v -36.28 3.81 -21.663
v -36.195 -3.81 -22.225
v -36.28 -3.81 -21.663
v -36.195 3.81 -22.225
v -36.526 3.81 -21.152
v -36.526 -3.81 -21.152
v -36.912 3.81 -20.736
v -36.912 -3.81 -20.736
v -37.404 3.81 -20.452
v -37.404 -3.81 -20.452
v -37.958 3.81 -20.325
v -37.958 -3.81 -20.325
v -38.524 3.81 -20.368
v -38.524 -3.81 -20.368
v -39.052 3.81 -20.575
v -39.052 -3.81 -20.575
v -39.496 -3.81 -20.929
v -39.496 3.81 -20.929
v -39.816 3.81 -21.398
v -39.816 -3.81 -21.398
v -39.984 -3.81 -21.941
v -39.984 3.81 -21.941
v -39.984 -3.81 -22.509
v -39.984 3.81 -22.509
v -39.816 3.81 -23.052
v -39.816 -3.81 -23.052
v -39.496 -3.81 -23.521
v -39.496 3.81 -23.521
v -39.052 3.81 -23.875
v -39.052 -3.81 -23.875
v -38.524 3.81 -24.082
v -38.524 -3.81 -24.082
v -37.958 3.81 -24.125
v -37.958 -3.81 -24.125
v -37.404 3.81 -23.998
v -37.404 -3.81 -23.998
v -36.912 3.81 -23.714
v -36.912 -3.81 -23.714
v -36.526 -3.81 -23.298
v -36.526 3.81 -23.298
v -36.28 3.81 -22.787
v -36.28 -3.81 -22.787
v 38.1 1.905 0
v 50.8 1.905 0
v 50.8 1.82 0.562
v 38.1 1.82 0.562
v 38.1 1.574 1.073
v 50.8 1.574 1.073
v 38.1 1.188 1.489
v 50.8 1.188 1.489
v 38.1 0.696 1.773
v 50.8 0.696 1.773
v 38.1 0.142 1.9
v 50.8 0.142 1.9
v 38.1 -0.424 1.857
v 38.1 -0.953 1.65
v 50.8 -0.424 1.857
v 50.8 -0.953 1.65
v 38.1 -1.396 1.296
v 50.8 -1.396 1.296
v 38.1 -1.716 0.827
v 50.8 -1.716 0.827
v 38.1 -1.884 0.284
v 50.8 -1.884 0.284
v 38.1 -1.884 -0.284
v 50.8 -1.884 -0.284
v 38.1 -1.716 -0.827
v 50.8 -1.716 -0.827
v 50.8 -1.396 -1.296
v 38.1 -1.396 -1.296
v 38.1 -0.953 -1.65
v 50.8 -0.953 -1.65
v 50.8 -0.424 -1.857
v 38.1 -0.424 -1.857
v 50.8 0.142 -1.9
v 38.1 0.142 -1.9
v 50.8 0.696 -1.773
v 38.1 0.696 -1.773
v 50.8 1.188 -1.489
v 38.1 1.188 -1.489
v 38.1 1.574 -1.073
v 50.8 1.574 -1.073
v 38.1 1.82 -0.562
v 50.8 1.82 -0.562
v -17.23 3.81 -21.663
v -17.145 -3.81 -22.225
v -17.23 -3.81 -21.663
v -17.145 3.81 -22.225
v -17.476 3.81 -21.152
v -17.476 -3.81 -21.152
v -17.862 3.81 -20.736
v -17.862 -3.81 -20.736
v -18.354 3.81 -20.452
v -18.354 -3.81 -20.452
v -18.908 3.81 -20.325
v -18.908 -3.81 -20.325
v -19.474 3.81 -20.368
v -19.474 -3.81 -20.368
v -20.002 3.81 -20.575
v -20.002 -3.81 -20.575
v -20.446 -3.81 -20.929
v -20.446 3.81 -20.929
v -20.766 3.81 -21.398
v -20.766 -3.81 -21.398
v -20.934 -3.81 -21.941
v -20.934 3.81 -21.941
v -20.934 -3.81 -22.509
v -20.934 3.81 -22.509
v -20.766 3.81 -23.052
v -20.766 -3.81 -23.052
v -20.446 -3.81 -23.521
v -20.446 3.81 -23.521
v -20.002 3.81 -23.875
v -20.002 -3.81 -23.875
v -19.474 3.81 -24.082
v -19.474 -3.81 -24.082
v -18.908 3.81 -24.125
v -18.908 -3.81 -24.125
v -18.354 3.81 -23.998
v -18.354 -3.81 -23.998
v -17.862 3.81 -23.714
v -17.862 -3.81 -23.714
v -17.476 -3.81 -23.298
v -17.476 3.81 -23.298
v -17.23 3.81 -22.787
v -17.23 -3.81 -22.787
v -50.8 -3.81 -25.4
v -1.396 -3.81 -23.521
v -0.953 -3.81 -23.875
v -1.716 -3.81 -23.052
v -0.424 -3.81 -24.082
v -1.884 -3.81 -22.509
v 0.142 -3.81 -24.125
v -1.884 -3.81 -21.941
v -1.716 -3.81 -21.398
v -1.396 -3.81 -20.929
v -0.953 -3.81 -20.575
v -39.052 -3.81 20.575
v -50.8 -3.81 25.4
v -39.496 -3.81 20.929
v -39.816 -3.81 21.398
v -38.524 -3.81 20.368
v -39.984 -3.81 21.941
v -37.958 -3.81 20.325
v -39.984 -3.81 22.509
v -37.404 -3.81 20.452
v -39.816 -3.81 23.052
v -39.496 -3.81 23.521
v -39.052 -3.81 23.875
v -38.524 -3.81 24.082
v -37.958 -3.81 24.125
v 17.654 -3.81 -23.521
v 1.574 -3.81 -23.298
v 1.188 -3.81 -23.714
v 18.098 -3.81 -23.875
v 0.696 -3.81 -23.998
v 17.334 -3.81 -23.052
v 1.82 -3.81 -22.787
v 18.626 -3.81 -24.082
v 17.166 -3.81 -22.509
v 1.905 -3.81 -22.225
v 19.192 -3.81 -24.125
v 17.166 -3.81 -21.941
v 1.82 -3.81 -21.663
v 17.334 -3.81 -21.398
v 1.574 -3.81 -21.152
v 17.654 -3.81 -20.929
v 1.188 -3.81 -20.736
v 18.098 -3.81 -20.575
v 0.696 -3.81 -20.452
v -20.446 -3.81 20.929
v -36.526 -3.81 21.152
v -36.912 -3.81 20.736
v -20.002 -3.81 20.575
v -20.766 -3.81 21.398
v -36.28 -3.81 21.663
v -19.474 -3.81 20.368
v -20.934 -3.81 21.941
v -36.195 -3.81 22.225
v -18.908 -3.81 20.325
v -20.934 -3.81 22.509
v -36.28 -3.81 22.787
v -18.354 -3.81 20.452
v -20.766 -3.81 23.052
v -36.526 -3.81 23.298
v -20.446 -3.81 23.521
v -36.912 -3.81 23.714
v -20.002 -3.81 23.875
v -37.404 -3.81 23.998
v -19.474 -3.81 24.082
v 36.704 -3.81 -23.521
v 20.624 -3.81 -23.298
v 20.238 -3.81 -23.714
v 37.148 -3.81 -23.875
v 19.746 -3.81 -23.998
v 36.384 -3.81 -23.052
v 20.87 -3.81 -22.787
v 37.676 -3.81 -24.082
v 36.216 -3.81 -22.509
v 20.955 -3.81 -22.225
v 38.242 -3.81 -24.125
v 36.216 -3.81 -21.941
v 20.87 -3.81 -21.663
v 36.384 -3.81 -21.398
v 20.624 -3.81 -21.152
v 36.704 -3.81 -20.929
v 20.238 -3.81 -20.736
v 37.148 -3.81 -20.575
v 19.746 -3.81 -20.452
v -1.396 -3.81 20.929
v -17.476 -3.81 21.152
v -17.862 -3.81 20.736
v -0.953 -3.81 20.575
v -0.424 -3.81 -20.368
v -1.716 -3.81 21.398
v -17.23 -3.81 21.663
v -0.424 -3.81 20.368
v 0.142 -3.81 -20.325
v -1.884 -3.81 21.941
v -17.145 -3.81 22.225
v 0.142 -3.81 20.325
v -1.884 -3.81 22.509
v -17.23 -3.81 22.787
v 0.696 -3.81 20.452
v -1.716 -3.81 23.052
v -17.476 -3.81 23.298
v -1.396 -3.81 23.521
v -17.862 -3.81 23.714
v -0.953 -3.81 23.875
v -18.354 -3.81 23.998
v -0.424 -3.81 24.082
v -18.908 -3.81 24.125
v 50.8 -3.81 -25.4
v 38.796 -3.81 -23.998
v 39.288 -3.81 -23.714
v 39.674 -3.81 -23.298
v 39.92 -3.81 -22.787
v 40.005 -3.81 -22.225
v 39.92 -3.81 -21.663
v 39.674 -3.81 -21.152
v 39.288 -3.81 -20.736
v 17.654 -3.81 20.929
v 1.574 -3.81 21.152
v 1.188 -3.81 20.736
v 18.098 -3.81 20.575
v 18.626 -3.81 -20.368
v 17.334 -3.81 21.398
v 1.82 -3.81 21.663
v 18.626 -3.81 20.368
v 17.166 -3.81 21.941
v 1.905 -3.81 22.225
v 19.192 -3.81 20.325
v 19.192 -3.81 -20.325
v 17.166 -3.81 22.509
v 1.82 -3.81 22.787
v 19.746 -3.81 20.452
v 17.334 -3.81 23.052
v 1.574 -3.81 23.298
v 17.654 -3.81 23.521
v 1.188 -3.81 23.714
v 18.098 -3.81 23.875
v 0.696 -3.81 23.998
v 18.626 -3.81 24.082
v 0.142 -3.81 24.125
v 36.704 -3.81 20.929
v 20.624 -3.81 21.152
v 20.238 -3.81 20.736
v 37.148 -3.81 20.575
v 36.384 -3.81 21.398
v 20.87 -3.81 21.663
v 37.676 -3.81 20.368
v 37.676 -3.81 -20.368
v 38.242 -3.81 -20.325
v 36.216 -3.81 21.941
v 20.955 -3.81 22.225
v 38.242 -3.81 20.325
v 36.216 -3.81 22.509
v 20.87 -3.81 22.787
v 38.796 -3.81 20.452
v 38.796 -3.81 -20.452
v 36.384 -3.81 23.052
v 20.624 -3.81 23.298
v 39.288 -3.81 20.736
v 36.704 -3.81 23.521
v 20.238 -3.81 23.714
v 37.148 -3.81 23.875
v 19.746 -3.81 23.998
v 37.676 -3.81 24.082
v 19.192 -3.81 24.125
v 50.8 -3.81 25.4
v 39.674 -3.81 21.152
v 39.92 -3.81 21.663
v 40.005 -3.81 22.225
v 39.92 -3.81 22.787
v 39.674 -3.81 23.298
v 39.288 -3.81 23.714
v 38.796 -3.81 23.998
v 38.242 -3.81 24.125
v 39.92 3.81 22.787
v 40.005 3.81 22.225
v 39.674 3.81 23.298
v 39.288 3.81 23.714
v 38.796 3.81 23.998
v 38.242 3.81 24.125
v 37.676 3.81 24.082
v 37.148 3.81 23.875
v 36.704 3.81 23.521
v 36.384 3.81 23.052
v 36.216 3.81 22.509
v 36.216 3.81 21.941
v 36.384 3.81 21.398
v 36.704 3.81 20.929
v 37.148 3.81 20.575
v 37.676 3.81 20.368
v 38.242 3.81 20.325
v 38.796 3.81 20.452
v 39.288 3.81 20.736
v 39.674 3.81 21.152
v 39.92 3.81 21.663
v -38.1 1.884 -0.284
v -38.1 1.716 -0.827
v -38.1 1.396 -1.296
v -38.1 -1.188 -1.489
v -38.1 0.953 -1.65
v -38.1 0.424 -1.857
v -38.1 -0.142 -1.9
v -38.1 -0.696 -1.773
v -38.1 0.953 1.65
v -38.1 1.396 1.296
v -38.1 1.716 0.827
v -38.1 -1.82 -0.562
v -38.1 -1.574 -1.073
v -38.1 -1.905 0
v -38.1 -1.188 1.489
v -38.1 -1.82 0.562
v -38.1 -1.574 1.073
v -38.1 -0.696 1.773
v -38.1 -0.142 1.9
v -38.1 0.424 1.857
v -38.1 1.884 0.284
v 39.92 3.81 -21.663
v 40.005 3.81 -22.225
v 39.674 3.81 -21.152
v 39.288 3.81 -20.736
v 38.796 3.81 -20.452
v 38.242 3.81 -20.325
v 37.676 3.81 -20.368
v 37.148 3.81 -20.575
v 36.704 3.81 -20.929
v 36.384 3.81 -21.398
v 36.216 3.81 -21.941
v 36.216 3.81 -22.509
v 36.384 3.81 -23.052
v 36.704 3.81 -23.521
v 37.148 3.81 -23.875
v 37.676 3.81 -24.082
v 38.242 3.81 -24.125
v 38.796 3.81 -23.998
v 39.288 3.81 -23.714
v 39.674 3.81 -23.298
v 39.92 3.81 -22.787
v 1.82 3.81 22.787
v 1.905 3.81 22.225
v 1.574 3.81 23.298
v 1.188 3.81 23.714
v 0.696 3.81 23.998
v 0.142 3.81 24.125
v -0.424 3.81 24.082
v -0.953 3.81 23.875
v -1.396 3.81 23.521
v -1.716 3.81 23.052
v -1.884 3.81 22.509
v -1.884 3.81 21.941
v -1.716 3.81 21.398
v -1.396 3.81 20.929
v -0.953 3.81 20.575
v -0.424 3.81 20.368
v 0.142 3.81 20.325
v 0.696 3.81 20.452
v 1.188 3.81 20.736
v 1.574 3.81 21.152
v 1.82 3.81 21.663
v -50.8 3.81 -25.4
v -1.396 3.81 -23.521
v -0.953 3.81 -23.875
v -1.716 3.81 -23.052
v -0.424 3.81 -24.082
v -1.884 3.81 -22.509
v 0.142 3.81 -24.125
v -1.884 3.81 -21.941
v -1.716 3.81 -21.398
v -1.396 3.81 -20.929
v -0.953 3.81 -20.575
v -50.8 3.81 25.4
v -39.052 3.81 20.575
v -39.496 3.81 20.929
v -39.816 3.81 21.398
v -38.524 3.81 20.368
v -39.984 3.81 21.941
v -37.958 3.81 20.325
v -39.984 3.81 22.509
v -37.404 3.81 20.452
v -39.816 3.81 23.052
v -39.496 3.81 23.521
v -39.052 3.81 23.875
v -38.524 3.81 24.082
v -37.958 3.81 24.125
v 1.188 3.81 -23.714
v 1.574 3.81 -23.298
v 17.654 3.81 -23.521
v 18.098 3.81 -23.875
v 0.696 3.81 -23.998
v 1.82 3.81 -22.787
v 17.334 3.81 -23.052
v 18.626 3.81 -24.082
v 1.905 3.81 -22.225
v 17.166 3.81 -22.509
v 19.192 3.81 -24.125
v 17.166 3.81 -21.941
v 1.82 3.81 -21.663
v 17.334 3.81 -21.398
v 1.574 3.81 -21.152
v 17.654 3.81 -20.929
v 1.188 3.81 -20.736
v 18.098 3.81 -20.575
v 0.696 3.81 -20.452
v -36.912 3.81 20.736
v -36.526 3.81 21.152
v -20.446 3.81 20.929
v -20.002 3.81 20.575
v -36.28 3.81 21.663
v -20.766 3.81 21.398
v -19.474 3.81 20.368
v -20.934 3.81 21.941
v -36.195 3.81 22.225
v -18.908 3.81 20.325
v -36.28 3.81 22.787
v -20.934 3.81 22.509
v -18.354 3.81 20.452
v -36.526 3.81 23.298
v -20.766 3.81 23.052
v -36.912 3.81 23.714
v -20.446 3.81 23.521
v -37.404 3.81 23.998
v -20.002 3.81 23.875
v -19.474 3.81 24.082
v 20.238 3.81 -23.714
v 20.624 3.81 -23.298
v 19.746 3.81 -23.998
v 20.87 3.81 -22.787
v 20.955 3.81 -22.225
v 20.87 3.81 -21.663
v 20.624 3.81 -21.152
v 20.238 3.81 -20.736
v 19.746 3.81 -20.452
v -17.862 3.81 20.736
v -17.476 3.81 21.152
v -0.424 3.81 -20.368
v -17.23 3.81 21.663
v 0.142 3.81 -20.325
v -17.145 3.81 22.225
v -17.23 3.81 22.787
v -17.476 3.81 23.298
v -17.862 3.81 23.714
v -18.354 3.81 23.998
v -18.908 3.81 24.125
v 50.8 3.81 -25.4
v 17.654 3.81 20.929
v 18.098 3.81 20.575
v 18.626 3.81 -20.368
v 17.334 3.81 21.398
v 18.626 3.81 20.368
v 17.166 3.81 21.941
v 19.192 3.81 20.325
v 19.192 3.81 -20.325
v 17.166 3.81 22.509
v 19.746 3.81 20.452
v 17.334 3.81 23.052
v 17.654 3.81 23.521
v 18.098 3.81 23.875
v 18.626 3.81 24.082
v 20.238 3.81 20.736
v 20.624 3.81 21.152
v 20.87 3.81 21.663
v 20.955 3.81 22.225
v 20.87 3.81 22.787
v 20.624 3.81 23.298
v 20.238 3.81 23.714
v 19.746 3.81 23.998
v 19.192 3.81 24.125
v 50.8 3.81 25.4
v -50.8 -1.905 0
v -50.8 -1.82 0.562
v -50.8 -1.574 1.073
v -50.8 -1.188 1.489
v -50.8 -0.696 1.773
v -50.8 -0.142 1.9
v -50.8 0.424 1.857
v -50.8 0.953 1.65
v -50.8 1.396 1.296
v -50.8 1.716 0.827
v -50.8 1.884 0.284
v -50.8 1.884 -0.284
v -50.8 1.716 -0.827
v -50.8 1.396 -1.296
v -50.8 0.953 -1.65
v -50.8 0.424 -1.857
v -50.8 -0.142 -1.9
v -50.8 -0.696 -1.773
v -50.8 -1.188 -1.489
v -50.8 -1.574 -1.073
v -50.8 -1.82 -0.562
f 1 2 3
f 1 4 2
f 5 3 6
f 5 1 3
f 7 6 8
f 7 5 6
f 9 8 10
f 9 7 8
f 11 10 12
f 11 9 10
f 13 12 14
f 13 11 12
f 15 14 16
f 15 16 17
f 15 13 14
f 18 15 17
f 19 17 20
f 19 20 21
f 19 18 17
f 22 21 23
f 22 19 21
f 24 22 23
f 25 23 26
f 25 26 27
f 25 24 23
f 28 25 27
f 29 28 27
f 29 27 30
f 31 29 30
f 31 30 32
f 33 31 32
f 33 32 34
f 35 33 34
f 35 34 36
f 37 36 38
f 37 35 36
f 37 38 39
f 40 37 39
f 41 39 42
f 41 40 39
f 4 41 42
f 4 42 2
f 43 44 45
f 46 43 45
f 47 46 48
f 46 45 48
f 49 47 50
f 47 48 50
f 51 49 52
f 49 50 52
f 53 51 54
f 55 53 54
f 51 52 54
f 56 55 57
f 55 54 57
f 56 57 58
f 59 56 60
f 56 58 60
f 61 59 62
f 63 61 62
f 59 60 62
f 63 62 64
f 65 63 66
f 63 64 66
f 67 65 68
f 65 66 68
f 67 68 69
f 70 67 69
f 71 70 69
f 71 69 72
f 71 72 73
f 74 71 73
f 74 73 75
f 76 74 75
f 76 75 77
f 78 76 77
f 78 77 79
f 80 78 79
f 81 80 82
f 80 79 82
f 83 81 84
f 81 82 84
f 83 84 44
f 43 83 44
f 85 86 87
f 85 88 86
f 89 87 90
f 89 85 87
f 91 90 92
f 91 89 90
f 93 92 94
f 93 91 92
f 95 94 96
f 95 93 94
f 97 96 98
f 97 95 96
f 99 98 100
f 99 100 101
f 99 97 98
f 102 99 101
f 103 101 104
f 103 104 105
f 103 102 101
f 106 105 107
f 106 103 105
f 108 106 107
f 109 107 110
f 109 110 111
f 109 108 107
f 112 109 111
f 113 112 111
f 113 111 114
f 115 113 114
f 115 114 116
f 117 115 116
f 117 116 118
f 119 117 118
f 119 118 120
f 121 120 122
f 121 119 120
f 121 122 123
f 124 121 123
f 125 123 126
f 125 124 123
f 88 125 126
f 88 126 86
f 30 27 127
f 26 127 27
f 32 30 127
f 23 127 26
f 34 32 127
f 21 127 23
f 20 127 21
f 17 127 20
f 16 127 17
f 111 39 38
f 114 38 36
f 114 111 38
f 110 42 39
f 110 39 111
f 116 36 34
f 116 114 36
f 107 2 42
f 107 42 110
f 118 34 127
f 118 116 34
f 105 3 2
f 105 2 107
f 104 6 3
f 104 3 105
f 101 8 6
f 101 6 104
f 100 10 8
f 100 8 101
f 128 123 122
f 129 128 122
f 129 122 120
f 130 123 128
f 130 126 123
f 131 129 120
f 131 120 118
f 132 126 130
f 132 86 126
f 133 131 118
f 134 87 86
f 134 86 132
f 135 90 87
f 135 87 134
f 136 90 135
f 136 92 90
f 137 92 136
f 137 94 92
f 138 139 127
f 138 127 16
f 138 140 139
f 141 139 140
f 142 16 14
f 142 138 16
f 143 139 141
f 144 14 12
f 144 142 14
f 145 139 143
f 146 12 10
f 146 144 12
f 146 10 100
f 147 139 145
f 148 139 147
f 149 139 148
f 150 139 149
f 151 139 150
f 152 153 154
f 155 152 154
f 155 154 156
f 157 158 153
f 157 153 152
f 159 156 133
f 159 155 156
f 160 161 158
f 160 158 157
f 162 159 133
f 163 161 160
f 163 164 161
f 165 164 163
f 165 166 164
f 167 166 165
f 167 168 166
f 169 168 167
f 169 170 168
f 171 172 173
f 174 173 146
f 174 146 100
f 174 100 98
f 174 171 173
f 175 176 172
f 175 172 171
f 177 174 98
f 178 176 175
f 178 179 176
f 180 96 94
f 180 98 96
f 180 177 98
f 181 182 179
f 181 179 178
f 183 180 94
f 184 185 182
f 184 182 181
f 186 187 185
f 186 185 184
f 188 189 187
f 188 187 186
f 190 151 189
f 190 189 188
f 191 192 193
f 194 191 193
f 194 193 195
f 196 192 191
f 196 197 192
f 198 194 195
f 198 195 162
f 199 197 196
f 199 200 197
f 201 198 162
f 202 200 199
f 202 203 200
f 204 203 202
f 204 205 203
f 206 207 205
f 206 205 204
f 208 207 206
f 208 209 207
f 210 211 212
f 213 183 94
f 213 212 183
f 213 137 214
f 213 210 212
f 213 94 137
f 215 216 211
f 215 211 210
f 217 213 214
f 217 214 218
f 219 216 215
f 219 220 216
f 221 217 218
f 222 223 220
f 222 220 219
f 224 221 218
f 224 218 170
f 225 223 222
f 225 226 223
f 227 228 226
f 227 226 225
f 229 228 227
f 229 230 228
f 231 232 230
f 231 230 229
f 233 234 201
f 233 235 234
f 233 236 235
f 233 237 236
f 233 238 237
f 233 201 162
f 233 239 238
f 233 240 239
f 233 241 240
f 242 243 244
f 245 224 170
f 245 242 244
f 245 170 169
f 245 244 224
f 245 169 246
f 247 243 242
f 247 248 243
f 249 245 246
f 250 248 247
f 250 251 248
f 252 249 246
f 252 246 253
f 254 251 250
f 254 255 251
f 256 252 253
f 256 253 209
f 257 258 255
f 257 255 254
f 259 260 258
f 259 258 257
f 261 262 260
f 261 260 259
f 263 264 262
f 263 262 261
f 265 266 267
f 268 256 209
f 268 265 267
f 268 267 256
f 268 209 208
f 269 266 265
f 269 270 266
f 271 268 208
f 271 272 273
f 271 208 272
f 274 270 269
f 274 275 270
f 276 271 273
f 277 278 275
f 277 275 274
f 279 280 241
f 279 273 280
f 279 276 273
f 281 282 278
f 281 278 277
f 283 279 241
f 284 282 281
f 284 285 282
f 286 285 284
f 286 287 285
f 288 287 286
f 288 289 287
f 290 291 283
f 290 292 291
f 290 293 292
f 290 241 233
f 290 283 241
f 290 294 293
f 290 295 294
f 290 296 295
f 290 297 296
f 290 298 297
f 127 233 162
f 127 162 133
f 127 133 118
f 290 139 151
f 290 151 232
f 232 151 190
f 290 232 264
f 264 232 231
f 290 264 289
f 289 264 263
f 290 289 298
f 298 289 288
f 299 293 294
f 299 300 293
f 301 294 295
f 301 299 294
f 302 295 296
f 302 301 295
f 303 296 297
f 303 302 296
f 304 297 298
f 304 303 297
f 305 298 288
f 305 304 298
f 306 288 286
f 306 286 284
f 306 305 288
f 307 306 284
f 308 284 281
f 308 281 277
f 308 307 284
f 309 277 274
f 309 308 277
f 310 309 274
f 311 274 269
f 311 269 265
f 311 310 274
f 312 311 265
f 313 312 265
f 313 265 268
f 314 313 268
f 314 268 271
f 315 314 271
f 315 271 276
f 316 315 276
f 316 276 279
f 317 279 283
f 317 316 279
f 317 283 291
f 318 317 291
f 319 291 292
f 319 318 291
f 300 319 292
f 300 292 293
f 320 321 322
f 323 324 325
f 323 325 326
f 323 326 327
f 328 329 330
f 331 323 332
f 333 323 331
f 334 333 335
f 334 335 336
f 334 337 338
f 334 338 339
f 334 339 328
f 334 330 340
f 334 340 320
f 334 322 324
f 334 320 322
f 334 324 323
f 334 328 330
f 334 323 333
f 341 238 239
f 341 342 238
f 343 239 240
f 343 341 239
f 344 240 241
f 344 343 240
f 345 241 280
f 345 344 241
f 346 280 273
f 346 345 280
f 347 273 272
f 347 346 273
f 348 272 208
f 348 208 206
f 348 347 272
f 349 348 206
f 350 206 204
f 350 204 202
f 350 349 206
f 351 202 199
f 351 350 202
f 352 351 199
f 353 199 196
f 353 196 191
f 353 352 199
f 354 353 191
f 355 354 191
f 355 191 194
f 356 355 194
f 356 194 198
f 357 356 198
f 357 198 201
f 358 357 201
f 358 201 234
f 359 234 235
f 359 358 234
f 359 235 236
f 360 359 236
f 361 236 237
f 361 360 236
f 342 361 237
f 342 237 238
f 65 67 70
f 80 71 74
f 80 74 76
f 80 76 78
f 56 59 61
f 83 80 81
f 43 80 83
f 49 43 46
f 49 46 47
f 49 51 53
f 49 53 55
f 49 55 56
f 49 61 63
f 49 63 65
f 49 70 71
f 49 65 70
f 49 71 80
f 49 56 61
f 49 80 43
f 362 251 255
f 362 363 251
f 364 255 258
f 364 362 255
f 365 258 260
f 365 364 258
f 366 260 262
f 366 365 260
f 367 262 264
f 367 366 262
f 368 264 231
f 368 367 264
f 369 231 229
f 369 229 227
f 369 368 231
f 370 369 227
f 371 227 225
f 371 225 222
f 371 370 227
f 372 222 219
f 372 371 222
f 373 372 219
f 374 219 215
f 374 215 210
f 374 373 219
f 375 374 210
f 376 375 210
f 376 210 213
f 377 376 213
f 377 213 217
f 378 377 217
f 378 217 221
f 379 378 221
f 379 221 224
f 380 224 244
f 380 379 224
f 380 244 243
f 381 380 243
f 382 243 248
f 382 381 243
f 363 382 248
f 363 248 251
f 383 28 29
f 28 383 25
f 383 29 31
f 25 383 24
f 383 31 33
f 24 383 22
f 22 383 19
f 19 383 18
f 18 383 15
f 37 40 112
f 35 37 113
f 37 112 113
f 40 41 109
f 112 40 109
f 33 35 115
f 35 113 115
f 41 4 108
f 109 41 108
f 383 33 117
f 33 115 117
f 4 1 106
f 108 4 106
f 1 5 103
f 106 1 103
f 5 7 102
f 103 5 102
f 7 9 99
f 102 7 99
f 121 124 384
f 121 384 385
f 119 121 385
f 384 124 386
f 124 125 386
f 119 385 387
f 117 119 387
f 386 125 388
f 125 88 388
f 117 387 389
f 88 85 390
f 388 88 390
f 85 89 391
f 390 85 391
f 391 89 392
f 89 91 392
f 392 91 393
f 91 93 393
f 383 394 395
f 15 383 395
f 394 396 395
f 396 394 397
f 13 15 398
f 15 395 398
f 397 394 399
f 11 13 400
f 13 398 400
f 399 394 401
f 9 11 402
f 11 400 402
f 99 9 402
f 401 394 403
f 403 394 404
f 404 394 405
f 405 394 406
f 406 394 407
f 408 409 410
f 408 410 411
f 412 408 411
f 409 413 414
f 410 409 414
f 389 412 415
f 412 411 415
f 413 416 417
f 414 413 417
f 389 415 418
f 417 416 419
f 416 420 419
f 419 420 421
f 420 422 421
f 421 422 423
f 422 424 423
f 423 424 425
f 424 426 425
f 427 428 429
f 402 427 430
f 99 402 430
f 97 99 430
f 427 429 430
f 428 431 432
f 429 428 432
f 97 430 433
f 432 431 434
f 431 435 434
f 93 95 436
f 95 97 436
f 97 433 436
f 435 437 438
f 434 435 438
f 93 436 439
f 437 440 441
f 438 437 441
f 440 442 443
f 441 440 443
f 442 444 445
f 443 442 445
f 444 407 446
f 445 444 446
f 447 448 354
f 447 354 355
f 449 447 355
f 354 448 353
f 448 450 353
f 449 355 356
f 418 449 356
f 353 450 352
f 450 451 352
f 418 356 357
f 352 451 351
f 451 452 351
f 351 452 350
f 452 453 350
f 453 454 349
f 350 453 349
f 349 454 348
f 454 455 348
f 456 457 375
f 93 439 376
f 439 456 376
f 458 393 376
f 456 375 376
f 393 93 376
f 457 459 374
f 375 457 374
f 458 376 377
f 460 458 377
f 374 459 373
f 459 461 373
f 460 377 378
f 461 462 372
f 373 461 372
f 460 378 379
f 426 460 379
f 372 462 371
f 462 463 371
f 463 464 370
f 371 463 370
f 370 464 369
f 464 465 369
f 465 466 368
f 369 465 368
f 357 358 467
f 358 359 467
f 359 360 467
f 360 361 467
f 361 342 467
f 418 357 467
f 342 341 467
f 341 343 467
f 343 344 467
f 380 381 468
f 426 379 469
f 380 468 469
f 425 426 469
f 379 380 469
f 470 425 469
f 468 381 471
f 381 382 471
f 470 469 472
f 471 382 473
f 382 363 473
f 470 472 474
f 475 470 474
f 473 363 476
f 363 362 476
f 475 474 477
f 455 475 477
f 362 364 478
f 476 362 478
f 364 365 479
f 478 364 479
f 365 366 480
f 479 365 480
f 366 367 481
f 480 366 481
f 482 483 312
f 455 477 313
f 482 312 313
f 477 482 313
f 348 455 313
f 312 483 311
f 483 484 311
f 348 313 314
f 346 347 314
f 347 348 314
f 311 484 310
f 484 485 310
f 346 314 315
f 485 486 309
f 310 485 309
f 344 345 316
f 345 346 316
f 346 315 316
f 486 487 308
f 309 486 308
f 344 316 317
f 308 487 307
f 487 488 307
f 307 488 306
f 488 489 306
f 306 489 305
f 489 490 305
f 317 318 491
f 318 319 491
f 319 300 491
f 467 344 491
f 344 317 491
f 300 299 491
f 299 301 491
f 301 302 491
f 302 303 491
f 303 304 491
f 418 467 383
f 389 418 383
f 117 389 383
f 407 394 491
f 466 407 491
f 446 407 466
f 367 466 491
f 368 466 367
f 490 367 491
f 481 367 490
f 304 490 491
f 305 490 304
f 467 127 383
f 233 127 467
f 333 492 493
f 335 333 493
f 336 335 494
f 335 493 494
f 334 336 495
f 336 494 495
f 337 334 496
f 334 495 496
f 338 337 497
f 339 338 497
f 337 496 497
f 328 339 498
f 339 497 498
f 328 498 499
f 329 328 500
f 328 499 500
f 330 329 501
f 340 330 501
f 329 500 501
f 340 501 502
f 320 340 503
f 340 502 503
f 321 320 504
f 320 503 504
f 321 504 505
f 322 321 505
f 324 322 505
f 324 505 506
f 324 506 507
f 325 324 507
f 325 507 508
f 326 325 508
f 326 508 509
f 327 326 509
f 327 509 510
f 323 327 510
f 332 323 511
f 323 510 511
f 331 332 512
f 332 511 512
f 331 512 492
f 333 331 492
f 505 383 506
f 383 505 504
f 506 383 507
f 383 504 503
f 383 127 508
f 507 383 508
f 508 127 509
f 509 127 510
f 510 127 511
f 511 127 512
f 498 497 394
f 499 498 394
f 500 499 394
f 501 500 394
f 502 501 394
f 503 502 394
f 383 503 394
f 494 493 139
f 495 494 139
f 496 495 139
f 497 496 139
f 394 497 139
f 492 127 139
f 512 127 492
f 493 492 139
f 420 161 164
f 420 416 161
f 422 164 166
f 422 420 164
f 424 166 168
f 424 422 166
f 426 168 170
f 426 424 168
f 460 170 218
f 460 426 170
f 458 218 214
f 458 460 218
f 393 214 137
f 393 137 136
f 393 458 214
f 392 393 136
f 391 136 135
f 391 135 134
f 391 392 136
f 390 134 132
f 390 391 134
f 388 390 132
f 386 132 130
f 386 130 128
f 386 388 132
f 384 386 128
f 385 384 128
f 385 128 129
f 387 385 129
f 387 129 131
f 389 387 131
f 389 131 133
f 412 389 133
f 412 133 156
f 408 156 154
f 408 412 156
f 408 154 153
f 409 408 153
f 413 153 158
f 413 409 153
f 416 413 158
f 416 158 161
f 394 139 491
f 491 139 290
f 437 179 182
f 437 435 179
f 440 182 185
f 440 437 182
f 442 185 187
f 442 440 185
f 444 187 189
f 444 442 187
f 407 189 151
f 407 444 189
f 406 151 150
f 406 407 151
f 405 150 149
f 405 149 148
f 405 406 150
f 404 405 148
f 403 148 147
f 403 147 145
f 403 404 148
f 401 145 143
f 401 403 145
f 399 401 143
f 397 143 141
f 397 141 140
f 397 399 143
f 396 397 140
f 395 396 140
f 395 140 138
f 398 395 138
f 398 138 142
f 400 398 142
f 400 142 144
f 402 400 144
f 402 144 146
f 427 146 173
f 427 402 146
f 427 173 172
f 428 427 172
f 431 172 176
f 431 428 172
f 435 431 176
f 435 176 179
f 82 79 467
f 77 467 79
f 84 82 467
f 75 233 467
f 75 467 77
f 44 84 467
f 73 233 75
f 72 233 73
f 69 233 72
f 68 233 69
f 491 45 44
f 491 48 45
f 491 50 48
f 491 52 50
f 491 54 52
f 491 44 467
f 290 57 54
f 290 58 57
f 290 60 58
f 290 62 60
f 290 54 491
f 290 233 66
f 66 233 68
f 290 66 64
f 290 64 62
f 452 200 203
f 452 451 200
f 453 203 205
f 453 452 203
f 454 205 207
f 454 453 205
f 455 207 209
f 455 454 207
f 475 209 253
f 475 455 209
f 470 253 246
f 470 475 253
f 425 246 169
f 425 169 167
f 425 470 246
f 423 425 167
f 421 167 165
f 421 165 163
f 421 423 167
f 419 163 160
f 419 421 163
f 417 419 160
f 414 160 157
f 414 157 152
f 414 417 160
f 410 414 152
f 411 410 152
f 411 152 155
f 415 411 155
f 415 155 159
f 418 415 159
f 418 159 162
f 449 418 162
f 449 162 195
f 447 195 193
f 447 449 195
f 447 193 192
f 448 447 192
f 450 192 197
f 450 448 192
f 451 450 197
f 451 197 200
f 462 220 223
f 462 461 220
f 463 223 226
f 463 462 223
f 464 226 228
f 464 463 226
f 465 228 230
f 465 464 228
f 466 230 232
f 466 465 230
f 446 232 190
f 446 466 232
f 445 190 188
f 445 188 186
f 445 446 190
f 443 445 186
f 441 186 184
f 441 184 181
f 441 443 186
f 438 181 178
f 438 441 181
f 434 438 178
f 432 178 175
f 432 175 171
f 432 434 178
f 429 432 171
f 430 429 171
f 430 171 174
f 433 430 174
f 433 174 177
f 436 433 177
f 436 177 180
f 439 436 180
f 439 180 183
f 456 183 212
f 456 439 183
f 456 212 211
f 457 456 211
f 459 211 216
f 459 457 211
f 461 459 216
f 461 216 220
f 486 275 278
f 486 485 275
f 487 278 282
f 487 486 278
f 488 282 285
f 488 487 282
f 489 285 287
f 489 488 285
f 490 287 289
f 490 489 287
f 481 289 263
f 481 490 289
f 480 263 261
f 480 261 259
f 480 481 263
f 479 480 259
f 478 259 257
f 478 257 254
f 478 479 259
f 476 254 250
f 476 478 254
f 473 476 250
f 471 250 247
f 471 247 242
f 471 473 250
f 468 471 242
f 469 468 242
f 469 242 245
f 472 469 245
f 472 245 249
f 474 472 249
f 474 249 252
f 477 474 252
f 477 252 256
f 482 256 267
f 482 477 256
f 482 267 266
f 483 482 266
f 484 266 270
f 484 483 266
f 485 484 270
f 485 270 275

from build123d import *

# Parameters (mm, degrees)
F0_W     = 101.6
F0_H     = 50.8
F0_R     = 1.905
F1_DEPTH = 3.81
F3_R     = 1.905
F4_DEPTH = 12.7
F6_R     = 1.905
F7_DEPTH = 12.7


with BuildPart() as f1:
    # F0 (on Front) → F1 (new body, symmetric)
    with BuildSketch(Plane.XZ):
        Rectangle(F0_W, F0_H)
        with Locations((-38.1, -22.225)):
            Circle(F0_R, mode=Mode.SUBTRACT)
        with Locations((-19.05, -22.225)):
            Circle(F0_R, mode=Mode.SUBTRACT)
        with Locations((0, -22.225)):
            Circle(F0_R, mode=Mode.SUBTRACT)
        with Locations((19.05, -22.225)):
            Circle(F0_R, mode=Mode.SUBTRACT)
        with Locations((38.1, -22.225)):
            Circle(F0_R, mode=Mode.SUBTRACT)
        with Locations((-38.1, 22.225)):
            Circle(F0_R, mode=Mode.SUBTRACT)
        with Locations((-19.05, 22.225)):
            Circle(F0_R, mode=Mode.SUBTRACT)
        with Locations((0, 22.225)):
            Circle(F0_R, mode=Mode.SUBTRACT)
        with Locations((19.05, 22.225)):
            Circle(F0_R, mode=Mode.SUBTRACT)
        with Locations((38.1, 22.225)):
            Circle(F0_R, mode=Mode.SUBTRACT)
    extrude(amount=F1_DEPTH, both=True)

    # F3 (on offset) → F4 (cut)
    with BuildSketch(Plane.YZ.offset(50.8)):
        Circle(F3_R)
    extrude(amount=-F4_DEPTH, mode=Mode.SUBTRACT)

    # F6 (on offset) → F7 (cut)
    with BuildSketch(Plane(origin=(-50.8, 0, 0), x_dir=(0, -1, 0), z_dir=(-1, 0, 0))):
        Circle(F6_R)
    extrude(amount=-F7_DEPTH, mode=Mode.SUBTRACT)


solid = f1.part
